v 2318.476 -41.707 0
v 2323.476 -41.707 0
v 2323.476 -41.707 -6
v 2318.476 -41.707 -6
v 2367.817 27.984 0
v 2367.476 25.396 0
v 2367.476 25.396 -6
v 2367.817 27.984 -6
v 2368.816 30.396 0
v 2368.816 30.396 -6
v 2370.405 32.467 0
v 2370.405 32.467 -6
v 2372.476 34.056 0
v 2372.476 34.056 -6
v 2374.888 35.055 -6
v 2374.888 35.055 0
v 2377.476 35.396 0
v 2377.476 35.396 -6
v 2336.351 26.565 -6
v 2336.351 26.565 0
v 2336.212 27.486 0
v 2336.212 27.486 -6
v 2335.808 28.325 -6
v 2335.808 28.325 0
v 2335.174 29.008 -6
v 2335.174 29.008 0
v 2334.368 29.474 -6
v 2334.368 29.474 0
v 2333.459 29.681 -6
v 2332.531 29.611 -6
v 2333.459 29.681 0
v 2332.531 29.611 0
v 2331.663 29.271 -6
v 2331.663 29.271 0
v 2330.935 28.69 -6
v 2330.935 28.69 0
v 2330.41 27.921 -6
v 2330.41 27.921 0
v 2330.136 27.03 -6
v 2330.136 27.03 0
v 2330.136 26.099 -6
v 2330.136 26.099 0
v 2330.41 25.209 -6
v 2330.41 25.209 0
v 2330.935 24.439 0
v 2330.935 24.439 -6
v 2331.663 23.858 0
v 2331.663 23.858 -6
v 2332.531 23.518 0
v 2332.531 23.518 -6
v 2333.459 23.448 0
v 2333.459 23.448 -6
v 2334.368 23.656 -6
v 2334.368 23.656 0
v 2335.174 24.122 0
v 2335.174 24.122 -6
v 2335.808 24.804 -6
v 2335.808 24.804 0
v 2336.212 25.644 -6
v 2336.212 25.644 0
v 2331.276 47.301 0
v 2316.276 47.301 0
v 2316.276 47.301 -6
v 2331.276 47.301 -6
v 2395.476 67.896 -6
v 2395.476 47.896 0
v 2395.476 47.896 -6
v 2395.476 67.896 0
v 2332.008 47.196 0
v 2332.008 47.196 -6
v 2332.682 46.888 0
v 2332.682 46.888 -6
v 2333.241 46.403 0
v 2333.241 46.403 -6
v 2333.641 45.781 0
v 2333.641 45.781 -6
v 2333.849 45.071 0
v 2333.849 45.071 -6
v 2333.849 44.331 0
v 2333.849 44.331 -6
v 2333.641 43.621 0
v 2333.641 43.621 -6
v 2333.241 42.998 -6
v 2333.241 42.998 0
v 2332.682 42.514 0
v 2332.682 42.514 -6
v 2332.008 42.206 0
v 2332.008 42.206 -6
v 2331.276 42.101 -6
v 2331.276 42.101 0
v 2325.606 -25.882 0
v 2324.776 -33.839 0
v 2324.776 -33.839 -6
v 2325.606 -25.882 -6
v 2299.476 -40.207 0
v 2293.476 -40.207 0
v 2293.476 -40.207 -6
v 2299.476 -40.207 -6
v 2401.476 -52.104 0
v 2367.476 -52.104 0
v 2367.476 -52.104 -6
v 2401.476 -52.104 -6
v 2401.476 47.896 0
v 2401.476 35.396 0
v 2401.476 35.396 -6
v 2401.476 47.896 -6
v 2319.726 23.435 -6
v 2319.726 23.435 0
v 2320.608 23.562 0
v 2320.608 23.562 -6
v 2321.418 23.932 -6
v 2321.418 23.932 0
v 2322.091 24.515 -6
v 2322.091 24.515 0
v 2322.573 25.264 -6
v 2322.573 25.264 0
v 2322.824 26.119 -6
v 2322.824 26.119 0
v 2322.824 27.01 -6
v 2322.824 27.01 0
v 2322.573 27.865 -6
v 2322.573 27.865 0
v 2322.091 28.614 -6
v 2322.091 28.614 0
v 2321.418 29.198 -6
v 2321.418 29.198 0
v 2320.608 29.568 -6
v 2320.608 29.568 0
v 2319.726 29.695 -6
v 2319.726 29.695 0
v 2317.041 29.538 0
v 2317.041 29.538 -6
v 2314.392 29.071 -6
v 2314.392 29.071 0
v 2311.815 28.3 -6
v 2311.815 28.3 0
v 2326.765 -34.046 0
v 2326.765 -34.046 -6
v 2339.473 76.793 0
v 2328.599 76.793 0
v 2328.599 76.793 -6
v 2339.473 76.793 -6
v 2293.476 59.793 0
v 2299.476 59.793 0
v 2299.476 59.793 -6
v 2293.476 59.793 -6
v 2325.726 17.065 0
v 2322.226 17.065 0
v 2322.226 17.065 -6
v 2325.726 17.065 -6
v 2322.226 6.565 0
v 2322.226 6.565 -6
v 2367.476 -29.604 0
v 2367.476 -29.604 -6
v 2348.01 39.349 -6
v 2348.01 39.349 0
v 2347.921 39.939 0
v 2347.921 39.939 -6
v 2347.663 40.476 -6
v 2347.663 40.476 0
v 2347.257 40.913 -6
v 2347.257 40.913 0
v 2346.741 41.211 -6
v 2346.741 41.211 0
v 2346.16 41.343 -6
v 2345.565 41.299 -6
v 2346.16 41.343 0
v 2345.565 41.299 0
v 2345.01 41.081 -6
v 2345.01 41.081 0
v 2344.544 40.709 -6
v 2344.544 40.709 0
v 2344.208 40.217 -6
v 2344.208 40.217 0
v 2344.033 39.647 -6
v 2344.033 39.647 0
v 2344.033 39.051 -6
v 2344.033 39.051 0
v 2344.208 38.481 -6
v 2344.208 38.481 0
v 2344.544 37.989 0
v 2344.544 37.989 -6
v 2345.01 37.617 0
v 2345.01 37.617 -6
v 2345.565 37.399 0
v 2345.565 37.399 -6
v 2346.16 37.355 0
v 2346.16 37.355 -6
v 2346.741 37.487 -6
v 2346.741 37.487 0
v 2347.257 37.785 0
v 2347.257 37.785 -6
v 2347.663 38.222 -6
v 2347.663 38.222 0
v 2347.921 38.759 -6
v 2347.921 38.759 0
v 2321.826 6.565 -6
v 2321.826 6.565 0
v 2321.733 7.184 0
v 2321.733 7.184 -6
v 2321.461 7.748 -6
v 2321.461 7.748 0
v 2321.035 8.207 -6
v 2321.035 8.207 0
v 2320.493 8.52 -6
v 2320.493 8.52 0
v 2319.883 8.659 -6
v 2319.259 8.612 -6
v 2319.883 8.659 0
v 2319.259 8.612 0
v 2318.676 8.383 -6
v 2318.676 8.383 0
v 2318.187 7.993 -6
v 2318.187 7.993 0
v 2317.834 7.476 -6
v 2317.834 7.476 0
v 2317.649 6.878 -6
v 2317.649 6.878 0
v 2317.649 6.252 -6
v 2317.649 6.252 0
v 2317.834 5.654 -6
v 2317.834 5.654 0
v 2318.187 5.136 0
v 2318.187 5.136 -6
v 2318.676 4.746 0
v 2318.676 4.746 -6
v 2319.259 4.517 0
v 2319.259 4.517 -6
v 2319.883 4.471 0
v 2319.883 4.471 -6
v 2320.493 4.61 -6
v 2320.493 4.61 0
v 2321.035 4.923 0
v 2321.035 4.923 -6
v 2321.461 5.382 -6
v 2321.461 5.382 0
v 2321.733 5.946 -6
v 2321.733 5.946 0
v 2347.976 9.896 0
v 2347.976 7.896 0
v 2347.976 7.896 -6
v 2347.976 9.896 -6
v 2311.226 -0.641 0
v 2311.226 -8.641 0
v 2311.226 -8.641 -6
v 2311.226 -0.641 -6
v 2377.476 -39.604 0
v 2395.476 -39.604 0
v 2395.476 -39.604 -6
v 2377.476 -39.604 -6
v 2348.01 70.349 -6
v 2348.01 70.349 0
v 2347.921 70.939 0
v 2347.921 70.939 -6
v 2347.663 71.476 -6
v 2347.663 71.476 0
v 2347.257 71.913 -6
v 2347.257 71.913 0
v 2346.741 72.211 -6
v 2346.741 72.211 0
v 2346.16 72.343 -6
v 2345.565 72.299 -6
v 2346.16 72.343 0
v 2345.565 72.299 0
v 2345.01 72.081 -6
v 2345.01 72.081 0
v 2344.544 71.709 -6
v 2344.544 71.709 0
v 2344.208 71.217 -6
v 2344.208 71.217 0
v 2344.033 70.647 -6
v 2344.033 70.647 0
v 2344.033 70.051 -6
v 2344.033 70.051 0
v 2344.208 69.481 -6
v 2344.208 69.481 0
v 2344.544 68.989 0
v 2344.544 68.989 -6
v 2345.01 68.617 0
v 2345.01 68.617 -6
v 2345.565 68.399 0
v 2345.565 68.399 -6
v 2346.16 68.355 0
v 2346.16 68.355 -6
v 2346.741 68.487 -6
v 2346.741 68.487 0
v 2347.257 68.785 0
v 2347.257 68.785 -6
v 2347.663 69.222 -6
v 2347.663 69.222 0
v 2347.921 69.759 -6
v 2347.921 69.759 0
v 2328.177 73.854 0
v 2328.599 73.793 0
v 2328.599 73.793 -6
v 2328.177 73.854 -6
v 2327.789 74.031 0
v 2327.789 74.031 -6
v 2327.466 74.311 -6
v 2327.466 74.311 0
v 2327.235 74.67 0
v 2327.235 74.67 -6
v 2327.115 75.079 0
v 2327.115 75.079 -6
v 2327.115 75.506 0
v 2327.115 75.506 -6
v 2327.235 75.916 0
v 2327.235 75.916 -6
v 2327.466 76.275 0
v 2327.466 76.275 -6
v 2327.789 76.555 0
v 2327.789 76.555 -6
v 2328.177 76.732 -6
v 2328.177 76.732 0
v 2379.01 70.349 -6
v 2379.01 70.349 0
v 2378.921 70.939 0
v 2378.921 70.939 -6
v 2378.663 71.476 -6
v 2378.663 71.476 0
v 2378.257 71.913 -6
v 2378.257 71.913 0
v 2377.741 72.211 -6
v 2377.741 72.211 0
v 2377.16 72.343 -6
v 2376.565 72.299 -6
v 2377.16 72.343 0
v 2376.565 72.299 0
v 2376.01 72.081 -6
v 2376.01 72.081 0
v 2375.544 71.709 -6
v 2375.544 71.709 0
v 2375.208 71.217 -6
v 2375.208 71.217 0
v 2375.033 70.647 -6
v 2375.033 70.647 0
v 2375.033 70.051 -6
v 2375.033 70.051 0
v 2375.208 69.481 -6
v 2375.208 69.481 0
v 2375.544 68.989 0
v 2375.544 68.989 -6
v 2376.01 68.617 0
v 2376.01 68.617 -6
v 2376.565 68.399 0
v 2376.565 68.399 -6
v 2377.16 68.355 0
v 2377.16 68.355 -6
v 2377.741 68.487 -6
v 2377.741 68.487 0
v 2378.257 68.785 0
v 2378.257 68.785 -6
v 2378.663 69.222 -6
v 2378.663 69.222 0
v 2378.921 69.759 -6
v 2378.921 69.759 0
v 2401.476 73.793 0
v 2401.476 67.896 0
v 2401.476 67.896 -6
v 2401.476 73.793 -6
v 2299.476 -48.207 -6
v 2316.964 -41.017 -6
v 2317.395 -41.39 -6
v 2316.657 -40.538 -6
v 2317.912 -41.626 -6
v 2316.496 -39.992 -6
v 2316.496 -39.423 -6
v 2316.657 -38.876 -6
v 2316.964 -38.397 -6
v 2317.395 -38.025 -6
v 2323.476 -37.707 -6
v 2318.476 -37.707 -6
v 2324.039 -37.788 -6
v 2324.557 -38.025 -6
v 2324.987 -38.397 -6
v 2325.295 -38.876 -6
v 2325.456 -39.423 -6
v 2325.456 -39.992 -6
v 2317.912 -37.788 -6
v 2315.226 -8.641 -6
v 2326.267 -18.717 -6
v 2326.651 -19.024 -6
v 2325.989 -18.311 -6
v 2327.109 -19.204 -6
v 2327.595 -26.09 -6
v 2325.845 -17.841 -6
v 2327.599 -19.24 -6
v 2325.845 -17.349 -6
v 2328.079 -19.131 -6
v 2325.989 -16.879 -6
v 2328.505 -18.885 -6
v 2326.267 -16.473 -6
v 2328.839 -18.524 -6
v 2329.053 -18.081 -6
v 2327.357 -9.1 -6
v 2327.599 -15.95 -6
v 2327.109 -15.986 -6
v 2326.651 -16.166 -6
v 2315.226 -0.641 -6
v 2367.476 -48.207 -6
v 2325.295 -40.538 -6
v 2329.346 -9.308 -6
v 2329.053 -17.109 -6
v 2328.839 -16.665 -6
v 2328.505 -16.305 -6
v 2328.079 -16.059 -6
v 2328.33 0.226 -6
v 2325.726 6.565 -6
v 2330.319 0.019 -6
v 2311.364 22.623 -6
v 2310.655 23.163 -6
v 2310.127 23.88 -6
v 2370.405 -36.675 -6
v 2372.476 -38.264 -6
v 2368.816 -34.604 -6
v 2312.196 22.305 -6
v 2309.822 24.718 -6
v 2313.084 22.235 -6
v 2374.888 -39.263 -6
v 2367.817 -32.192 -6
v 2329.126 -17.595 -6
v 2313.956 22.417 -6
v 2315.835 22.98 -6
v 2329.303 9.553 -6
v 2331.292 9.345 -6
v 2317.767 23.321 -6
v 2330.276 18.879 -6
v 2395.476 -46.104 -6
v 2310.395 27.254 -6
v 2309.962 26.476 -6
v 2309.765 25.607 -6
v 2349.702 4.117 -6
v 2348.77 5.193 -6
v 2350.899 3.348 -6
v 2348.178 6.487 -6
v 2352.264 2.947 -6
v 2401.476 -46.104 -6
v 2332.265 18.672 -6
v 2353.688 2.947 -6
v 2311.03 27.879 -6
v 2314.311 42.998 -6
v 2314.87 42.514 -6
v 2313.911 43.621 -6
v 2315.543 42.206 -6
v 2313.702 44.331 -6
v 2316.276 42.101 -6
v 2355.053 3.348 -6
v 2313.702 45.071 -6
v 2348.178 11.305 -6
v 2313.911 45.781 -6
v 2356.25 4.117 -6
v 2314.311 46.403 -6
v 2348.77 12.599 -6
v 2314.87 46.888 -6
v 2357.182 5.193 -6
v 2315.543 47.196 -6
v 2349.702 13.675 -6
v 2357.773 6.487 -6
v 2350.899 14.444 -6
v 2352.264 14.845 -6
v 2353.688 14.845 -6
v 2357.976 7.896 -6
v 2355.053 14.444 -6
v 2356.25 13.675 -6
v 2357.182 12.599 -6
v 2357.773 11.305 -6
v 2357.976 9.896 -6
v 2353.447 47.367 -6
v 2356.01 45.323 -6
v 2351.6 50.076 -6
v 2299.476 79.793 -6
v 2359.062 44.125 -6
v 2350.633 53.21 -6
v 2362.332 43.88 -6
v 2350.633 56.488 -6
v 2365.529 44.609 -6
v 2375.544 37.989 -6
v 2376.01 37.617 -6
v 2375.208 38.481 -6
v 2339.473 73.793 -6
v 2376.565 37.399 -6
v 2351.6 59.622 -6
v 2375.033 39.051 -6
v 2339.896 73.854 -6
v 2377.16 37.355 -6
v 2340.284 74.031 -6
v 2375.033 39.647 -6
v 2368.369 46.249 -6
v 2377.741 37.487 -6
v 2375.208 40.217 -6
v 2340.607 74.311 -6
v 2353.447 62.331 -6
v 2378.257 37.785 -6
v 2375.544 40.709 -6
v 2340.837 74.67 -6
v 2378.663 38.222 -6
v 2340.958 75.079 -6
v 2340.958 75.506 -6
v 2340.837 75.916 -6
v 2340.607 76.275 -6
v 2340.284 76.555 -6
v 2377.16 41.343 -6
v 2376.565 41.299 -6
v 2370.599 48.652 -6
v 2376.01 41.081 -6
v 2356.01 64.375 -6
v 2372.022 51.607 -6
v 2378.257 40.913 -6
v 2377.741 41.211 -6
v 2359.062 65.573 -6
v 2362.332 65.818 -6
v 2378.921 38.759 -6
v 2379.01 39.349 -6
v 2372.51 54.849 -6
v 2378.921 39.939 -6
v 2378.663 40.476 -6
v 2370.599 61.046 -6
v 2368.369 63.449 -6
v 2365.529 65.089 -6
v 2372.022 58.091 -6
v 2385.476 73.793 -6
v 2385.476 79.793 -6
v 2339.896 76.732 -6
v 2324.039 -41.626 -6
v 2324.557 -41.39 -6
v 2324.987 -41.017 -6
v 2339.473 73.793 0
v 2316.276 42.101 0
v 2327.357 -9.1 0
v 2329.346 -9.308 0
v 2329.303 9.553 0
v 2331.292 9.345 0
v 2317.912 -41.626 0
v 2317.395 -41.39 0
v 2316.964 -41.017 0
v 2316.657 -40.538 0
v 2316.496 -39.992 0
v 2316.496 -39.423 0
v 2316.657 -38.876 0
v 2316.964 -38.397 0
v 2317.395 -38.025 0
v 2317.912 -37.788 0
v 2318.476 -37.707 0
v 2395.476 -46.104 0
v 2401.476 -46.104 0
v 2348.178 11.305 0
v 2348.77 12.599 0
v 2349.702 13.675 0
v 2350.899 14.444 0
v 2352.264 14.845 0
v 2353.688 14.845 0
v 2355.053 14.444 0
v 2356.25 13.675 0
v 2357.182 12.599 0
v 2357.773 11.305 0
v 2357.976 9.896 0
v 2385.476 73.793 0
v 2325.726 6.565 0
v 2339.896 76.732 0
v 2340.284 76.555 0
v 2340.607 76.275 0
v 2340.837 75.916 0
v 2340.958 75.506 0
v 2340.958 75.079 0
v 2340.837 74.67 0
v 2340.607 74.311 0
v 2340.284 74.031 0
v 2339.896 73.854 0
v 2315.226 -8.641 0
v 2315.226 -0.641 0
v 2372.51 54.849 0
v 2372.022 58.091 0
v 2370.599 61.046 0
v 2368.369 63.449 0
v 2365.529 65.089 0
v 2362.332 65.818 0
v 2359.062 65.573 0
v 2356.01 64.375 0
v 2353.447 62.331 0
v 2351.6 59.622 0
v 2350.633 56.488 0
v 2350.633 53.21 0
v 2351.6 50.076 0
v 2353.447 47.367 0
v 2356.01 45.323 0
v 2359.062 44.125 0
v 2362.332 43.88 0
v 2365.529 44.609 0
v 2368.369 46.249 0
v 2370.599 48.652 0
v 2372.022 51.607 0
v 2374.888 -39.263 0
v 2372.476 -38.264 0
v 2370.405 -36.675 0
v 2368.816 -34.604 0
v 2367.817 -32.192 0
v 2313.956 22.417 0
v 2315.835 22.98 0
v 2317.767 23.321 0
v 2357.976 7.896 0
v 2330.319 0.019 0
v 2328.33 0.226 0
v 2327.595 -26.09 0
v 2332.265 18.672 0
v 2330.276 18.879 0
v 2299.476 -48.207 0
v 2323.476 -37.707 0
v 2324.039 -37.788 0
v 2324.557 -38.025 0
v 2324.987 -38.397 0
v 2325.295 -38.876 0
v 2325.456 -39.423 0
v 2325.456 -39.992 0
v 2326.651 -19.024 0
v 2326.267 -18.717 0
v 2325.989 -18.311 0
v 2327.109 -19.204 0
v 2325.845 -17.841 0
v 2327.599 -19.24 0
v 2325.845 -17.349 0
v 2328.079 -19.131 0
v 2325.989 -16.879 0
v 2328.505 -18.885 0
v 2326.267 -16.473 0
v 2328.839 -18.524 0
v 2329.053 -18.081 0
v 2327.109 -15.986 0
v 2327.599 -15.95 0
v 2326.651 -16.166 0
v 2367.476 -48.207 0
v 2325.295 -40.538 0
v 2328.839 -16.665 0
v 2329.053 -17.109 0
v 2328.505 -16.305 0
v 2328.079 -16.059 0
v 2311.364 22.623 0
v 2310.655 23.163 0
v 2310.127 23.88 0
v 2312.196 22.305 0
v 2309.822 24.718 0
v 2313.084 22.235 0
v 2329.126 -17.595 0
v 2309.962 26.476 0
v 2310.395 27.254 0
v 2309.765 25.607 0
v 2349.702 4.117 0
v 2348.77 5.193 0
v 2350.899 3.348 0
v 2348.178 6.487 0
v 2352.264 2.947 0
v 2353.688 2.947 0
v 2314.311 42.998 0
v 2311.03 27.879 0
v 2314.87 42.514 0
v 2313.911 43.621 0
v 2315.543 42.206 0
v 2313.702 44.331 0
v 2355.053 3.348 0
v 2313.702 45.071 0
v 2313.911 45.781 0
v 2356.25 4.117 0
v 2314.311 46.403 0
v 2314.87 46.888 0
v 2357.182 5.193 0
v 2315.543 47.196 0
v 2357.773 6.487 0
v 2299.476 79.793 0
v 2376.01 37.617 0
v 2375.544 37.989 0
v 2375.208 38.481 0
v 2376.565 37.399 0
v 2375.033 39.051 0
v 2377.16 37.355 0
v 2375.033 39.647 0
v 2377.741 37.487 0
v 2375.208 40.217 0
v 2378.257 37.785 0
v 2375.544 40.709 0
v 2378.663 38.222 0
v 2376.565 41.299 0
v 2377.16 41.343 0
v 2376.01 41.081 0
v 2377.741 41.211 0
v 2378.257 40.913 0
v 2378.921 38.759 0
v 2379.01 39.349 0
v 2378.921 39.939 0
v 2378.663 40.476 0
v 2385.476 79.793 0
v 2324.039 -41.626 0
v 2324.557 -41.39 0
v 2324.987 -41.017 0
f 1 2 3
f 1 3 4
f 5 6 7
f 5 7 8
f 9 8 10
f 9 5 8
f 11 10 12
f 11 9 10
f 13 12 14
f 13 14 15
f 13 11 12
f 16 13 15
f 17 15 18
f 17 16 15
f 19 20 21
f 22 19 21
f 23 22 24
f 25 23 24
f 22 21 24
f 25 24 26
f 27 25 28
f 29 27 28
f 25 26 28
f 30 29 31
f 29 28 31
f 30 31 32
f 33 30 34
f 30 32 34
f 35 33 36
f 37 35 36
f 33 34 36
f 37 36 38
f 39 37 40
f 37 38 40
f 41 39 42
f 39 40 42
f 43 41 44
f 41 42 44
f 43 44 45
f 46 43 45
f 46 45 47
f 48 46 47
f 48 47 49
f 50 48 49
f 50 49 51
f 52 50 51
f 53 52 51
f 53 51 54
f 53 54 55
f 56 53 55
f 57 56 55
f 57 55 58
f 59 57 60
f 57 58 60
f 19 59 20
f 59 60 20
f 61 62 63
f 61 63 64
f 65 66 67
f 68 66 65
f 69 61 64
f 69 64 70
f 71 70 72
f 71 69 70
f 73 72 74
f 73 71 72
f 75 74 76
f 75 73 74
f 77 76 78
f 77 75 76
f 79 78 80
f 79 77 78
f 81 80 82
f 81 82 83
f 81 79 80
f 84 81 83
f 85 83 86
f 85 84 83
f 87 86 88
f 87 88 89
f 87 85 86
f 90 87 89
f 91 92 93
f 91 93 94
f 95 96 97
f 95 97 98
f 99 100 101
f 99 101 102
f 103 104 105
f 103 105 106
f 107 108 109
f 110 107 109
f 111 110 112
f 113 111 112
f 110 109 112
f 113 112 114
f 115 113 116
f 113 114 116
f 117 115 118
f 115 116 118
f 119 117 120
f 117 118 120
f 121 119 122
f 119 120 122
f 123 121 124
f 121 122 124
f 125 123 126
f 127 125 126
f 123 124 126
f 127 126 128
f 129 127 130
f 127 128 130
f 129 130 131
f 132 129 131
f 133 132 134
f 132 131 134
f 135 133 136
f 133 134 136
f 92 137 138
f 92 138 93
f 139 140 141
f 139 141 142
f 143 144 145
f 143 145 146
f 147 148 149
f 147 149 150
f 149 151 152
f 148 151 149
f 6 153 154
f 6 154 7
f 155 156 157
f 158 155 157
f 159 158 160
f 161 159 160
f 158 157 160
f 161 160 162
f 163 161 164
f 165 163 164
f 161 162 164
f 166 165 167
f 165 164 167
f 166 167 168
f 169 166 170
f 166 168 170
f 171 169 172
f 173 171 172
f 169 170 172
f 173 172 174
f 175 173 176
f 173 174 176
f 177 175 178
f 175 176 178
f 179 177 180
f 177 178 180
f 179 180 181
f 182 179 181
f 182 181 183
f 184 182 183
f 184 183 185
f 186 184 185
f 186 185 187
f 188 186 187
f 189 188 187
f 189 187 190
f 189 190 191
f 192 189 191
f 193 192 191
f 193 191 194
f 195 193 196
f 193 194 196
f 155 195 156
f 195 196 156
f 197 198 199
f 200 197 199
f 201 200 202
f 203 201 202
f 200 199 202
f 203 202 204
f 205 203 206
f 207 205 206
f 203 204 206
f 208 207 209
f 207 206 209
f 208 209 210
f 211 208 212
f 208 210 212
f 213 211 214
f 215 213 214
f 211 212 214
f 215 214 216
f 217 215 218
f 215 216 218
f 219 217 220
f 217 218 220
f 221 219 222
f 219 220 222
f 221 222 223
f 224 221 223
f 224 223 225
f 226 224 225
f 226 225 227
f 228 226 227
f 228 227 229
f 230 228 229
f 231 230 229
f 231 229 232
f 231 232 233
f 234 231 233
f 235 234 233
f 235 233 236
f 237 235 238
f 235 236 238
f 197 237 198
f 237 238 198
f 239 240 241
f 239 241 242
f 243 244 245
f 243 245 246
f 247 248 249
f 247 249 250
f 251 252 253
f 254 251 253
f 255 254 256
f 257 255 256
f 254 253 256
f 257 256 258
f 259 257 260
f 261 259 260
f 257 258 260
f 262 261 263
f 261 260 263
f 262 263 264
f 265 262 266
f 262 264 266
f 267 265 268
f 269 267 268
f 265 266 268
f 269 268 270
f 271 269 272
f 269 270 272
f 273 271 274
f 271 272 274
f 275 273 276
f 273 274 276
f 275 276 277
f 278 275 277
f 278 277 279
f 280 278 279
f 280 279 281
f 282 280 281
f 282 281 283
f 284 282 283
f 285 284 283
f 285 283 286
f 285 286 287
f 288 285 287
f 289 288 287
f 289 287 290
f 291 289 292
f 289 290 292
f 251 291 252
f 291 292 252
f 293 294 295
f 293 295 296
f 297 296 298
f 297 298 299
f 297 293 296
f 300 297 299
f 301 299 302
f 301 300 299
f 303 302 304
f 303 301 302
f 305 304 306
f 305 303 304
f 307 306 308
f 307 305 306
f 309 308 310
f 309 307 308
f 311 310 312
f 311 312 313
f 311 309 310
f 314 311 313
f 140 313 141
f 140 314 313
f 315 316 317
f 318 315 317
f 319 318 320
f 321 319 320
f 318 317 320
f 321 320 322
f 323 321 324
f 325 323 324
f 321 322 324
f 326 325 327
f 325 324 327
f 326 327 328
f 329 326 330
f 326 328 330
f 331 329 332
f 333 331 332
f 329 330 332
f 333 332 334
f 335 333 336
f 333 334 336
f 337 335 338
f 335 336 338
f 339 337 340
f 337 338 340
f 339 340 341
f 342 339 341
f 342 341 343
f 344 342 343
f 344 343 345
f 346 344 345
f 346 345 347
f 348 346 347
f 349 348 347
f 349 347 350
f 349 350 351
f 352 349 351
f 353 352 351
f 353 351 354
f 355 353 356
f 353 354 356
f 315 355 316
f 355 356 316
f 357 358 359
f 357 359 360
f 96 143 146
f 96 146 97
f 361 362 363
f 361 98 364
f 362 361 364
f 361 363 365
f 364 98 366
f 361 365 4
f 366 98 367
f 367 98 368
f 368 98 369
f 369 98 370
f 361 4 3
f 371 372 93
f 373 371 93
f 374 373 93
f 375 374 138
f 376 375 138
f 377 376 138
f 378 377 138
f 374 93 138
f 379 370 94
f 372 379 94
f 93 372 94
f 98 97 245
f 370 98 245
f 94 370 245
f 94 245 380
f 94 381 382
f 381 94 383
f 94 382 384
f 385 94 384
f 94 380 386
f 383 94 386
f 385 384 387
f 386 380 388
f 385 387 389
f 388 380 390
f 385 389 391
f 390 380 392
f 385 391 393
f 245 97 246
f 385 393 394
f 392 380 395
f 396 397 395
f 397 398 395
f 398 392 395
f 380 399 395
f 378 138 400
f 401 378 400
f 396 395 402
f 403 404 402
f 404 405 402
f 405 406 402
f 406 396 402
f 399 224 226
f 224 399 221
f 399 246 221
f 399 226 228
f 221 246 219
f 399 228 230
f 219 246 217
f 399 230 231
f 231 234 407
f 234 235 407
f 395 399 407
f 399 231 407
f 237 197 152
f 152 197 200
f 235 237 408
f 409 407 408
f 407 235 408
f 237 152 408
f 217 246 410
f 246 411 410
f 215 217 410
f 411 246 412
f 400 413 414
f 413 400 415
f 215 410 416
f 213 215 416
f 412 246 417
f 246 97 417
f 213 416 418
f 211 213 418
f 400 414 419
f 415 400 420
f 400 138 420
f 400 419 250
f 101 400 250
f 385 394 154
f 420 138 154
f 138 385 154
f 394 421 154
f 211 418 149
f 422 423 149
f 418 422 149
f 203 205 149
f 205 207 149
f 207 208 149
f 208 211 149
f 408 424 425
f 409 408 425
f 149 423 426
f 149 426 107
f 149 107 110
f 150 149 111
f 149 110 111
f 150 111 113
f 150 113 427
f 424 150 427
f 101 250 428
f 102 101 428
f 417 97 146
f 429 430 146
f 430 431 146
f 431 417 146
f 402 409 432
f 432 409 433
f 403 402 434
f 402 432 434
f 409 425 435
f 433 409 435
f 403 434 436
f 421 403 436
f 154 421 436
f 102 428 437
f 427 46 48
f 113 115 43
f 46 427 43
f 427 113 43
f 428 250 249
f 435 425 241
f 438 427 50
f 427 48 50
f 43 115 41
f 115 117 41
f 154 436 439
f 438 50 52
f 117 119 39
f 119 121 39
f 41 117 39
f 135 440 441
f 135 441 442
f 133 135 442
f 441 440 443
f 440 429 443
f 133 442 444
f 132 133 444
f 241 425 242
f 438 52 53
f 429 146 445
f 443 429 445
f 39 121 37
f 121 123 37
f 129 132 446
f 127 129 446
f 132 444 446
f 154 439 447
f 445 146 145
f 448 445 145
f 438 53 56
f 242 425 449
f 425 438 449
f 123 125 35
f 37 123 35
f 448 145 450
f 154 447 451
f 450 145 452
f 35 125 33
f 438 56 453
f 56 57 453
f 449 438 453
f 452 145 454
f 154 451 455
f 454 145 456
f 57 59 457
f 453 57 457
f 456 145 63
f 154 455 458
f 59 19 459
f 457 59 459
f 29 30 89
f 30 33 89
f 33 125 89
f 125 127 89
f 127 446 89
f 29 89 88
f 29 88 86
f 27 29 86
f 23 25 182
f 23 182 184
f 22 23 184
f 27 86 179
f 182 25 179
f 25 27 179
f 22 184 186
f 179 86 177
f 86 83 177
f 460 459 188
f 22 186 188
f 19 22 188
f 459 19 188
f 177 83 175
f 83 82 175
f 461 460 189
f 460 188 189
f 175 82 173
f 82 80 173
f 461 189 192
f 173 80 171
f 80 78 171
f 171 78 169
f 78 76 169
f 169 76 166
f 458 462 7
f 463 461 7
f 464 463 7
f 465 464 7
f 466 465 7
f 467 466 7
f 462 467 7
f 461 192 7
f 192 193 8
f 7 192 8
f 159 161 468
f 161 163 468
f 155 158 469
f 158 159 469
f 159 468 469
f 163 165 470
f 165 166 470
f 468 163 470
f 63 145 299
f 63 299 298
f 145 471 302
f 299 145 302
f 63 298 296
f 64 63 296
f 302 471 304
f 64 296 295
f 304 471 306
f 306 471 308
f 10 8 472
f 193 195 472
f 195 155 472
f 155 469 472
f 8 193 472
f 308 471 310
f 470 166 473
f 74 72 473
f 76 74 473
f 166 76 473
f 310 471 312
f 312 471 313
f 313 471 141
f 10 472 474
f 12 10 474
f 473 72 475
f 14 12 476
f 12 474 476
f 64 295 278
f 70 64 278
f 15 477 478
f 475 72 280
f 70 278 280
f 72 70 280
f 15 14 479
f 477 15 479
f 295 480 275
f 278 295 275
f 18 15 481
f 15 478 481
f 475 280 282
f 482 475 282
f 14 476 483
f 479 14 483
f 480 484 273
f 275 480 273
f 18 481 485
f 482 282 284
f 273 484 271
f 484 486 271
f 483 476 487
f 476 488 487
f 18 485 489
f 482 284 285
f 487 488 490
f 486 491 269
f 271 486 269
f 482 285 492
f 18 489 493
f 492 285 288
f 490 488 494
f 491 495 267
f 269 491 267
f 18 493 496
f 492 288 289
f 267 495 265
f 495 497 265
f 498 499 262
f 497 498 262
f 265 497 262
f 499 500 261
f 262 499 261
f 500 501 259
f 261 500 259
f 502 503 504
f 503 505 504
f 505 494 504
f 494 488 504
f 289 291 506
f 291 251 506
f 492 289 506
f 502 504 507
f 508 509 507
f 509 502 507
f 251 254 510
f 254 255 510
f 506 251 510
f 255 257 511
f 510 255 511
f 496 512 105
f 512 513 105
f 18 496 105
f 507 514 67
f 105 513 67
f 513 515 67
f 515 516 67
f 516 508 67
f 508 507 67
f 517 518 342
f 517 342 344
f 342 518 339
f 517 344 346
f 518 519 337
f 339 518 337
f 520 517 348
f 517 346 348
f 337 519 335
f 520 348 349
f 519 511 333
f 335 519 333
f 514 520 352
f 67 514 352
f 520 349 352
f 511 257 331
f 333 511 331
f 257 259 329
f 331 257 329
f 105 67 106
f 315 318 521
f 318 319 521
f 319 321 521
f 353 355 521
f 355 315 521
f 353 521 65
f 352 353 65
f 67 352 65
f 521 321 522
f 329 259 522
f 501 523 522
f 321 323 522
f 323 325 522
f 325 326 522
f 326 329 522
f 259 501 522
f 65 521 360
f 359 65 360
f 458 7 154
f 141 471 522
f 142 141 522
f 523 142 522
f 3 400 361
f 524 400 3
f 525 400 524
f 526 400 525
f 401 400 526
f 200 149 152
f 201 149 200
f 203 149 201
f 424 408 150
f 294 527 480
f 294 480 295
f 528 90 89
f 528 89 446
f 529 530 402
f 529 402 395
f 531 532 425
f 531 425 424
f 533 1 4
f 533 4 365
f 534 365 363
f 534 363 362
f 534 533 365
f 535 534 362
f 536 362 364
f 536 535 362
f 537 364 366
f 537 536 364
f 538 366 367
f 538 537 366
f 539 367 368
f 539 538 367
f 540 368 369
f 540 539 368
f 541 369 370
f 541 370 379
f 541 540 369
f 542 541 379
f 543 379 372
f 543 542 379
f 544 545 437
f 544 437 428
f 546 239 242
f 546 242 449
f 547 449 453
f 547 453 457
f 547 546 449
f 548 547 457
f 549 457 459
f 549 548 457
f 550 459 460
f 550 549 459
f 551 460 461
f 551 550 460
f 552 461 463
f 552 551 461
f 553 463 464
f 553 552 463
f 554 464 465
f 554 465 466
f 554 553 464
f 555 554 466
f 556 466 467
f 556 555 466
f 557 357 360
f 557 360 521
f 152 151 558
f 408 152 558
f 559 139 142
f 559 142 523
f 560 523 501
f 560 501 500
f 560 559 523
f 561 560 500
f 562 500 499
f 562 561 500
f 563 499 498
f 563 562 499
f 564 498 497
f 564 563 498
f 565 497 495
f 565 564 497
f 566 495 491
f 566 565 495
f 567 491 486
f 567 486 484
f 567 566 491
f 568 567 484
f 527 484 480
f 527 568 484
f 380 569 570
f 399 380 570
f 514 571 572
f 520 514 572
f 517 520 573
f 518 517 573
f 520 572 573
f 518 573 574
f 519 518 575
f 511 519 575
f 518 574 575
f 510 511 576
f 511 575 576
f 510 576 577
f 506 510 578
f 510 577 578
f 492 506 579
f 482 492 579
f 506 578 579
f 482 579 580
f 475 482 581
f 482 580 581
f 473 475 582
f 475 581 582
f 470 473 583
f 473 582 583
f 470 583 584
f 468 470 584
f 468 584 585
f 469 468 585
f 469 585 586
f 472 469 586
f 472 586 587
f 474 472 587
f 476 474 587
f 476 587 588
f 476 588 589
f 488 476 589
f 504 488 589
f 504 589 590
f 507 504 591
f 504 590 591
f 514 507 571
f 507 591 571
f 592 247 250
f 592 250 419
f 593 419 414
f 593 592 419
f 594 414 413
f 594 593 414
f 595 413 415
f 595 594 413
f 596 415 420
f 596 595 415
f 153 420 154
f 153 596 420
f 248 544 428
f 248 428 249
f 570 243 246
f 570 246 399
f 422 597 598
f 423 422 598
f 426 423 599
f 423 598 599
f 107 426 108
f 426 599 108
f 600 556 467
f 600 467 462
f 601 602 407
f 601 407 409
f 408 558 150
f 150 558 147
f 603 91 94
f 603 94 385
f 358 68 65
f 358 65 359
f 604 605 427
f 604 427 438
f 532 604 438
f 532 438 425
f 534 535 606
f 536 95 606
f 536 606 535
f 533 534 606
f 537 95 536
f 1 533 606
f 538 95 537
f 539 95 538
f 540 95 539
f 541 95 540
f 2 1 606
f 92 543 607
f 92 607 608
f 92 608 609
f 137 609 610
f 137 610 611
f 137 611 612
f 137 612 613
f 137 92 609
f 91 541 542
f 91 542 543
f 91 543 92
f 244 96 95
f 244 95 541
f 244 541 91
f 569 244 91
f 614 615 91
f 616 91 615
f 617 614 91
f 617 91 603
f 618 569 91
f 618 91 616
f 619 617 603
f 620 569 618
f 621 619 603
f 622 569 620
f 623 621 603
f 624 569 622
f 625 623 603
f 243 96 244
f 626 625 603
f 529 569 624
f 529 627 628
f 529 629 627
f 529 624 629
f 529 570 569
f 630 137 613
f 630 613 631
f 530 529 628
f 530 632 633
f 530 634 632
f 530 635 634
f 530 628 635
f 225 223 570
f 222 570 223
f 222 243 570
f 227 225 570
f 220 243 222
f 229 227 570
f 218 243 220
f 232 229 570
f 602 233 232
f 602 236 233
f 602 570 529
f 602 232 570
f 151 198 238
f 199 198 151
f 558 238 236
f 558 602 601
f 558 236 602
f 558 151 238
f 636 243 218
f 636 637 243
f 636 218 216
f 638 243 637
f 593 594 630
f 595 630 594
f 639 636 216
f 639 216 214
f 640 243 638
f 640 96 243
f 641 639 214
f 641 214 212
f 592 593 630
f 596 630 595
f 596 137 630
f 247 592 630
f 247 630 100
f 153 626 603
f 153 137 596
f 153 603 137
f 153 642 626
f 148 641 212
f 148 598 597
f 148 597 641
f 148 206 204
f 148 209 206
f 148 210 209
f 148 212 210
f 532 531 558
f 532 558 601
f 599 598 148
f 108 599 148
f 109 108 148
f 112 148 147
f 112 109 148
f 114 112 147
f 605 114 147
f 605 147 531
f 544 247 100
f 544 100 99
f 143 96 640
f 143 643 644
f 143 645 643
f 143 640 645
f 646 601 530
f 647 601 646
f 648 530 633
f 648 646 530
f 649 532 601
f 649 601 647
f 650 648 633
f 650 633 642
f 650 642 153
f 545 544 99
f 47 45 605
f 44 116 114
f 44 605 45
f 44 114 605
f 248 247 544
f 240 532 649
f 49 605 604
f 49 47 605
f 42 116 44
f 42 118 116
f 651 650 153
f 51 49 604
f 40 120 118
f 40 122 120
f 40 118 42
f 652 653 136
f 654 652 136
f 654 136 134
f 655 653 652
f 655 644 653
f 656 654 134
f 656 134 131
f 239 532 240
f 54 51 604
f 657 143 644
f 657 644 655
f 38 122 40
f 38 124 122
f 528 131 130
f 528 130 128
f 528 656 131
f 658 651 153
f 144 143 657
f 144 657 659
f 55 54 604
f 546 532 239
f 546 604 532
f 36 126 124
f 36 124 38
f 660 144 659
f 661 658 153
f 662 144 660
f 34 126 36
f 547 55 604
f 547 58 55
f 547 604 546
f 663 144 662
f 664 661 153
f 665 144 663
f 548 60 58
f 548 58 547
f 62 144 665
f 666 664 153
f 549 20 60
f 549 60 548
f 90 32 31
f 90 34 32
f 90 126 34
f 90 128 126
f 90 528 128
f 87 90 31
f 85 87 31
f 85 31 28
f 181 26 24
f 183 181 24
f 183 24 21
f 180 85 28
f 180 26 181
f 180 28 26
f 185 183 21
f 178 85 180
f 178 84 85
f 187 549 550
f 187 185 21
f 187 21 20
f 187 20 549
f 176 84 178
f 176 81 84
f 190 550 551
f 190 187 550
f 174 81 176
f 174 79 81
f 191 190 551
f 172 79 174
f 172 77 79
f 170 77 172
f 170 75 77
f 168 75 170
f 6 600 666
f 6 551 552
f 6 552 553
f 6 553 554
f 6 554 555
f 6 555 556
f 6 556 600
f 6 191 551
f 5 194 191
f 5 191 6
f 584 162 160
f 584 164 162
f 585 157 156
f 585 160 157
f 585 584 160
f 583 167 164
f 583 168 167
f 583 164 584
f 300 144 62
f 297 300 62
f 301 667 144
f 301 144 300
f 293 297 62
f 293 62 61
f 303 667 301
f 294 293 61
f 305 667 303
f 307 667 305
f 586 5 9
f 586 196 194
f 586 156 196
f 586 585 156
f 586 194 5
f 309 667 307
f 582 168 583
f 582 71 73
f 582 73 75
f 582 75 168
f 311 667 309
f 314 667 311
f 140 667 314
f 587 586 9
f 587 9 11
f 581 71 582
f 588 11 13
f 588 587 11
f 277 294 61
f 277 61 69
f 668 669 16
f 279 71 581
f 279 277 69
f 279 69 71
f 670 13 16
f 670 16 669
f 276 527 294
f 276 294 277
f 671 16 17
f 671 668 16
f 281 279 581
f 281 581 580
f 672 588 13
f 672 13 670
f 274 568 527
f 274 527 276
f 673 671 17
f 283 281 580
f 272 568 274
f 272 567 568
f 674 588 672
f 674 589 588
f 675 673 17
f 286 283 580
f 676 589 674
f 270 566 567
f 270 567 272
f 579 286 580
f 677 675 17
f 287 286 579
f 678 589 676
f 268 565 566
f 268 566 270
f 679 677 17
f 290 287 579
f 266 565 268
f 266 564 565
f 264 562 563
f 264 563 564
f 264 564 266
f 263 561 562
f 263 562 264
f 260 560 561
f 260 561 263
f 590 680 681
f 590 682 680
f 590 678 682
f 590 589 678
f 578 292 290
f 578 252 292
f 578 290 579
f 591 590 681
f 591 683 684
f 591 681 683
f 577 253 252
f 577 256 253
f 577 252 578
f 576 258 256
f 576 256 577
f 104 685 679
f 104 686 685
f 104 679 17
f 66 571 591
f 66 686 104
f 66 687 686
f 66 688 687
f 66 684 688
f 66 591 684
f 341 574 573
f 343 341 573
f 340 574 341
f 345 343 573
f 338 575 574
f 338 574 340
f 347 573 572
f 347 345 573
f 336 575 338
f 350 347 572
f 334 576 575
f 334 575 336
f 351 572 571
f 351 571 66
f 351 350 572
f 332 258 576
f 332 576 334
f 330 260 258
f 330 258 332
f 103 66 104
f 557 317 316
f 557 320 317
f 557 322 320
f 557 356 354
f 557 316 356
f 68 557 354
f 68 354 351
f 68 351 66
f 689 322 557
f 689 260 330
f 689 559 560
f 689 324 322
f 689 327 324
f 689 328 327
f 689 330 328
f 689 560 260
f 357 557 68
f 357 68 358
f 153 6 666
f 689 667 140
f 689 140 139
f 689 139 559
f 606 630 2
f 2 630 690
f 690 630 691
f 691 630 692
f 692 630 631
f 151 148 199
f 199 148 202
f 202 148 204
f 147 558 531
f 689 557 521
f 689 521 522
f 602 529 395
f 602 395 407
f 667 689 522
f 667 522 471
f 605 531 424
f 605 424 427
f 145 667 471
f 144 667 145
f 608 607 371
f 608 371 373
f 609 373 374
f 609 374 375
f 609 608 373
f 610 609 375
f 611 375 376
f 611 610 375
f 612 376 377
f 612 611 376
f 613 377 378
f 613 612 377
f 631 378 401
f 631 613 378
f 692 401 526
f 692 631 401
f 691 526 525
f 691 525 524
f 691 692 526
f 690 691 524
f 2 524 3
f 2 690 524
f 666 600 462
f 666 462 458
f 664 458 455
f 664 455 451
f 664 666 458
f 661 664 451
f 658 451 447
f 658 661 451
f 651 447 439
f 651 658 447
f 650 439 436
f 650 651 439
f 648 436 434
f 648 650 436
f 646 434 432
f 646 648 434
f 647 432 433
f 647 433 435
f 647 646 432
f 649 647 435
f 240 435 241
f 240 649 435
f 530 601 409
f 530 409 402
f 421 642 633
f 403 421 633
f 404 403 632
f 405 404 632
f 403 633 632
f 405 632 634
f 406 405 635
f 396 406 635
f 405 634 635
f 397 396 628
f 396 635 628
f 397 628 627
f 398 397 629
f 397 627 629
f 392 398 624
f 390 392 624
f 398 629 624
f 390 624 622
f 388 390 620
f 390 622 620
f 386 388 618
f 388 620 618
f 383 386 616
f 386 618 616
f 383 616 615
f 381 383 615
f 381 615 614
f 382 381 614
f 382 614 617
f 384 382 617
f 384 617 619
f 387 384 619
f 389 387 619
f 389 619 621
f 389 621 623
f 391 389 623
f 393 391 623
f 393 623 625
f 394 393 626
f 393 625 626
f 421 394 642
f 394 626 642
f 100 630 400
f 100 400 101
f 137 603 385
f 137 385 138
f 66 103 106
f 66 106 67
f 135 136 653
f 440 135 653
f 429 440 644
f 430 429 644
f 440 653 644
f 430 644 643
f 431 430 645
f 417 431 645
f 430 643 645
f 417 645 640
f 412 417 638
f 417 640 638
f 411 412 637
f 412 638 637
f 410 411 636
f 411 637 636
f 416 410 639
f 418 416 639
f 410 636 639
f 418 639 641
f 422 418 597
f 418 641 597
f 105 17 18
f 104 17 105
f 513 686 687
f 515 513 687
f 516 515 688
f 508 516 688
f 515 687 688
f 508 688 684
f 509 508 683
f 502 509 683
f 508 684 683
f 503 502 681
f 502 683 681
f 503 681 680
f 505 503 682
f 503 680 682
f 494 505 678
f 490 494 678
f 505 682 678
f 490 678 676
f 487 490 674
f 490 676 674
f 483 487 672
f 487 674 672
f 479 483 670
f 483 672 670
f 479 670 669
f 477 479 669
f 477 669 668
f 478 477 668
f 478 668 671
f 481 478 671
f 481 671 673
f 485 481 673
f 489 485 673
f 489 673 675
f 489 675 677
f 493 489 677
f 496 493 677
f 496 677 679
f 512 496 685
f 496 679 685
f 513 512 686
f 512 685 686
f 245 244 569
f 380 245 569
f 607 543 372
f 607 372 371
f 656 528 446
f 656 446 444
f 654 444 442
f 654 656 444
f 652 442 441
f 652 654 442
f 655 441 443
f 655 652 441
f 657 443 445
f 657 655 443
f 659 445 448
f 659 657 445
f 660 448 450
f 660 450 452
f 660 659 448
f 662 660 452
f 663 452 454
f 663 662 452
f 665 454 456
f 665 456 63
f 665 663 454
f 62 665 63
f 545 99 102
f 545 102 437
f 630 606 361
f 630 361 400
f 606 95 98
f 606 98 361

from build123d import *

# Parameters (mm, degrees)
ESQUISSE1_R        = 2
ESQUISSE1_R_2      = 11
ESQUISSE1_R_3      = 3.125
ESQUISSE1_R_4      = 2.1
ESQUISSE1_R_5      = 1.65
ESQUISSE1_W        = 4
ESQUISSE1_H        = 8
ESQUISSE1_W_2      = 3.5
ESQUISSE1_H_2      = 10.5
BOSS_EXTRU_1_DEPTH = 6


with BuildPart() as part:
    # Esquisse1 → Boss.-Extru.1 (new body)
    with BuildSketch(Plane.XY):
        with BuildLine():
            Line((2401.475943532, -52.104091931), (2401.475943532, -46.104091931))
            Line((2401.475943532, -46.104091931), (2395.475943532, -46.104091931))
            Line((2395.475943532, -46.104091931), (2395.475943532, -39.604091931))
            Line((2395.475943532, -39.604091931), (2377.475943532, -39.604091931))
            ThreePointArc((2377.475943532, -39.604091931), (2370.40487572, -36.675159743), (2367.475943532, -29.604091931))
            Line((2367.475943532, -29.604091931), (2367.475943532, 25.395908069))
            ThreePointArc((2367.475943532, 25.395908069), (2370.40487572, 32.466975881), (2377.475943532, 35.395908069))
            Line((2377.475943532, 35.395908069), (2397.475943532, 35.395908069))
            Line((2397.475943532, 35.395908069), (2401.475943532, 35.395908069))
            Line((2401.475943532, 35.395908069), (2401.475943532, 47.895908069))
            Line((2401.475943532, 47.895908069), (2395.475943532, 47.895908069))
            Line((2395.475943532, 47.895908069), (2395.475943532, 67.895908069))
            Line((2395.475943532, 67.895908069), (2401.475943532, 67.895908069))
            Line((2401.475943532, 67.895908069), (2401.475943532, 73.792808343))
            Line((2401.475943532, 73.792808343), (2395.475943532, 73.792808343))
            Line((2395.475943532, 73.792808343), (2385.475943532, 73.792808343))
            Line((2385.475943532, 73.792808343), (2385.475943532, 79.792808343))
            Line((2385.475943532, 79.792808343), (2299.475943532, 79.792808343))
            Line((2299.475943532, 79.792808343), (2299.475943532, 59.792808343))
            Line((2299.475943532, 59.792808343), (2293.475943532, 59.792808343))
            Line((2293.475943532, 59.792808343), (2293.475943532, -40.20719166))
            Line((2293.475943532, -40.20719166), (2299.475943532, -40.20719166))
            Line((2299.475943532, -40.20719166), (2299.475943532, -48.20719166))
            Line((2299.475943532, -48.20719166), (2367.475943532, -48.20719166))
            Line((2367.475943532, -48.20719166), (2367.475943532, -52.104091931))
            Line((2367.475943532, -52.104091931), (2401.475943532, -52.104091931))
        make_face()
        with Locations((2346.01021478, 70.349007801)):
            Circle(ESQUISSE1_R, mode=Mode.SUBTRACT)
        with Locations((2377.01021478, 70.349007801)):
            Circle(ESQUISSE1_R, mode=Mode.SUBTRACT)
        with Locations((2377.01021478, 39.349007801)):
            Circle(ESQUISSE1_R, mode=Mode.SUBTRACT)
        with Locations((2361.51021478, 54.849007801)):
            Circle(ESQUISSE1_R_2, mode=Mode.SUBTRACT)
        with Locations((2346.01021478, 39.349007801)):
            Circle(ESQUISSE1_R, mode=Mode.SUBTRACT)
        with Locations((2333.225943532, 26.564736553)):
            Circle(ESQUISSE1_R_3, mode=Mode.SUBTRACT)
        with Locations((2319.725943533, 6.564736553)):
            Circle(ESQUISSE1_R_4, mode=Mode.SUBTRACT)
        with Locations((2327.476078896, -17.594891177)):
            Circle(ESQUISSE1_R_5, mode=Mode.SUBTRACT)
        with BuildLine():
            Line((2331.275943532, 42.100855433), (2316.275943532, 42.100855433))
            ThreePointArc((2316.275943532, 42.100855433), (2313.675943532, 44.700855433), (2316.275943532, 47.300855433))
            Line((2316.275943532, 47.300855433), (2331.275943532, 47.300855433))
            ThreePointArc((2331.275943532, 47.300855433), (2333.875943532, 44.700855433), (2331.275943532, 42.100855433))
        make_face(mode=Mode.SUBTRACT)
        with BuildLine():
            Line((2347.975943532, 7.895908069), (2347.975943532, 9.895908069))
            ThreePointArc((2347.975943532, 9.895908069), (2352.975943532, 14.895908069), (2357.975943532, 9.895908069))
            Line((2357.975943532, 9.895908069), (2357.975943532, 7.895908069))
            ThreePointArc((2357.975943532, 7.895908069), (2352.975943532, 2.895908069), (2347.975943532, 7.895908069))
        make_face(mode=Mode.SUBTRACT)
        with BuildLine():
            Line((2339.47303261, 73.792808343), (2328.599494457, 73.792808343))
            ThreePointArc((2328.599494457, 73.792808343), (2327.099494457, 75.292808343), (2328.599494457, 76.792808343))
            Line((2328.599494457, 76.792808343), (2339.47303261, 76.792808343))
            ThreePointArc((2339.47303261, 76.792808343), (2340.97303261, 75.292808343), (2339.47303261, 73.792808343))
        make_face(mode=Mode.SUBTRACT)
        with Locations((2313.225943533, -4.641462904)):
            Rectangle(ESQUISSE1_W, ESQUISSE1_H, mode=Mode.SUBTRACT)
        Polygon((2329.302925864, 9.55284837), (2330.275943532, 18.879356423), (2332.265147216, 18.67182641), (2331.292129548, 9.345318358), align=None, mode=Mode.SUBTRACT)
        Polygon((2327.356890528, -9.100167734), (2328.329908196, 0.226340318), (2330.31911188, 0.018810306), (2329.346094212, -9.307697746), align=None, mode=Mode.SUBTRACT)
        Polygon((2324.775943532, -33.838899342), (2325.606063581, -25.882084609), (2327.595267264, -26.089614621), (2326.765147216, -34.046429354), align=None, mode=Mode.SUBTRACT)
        with Locations((2323.975943533, 11.814736553)):
            Rectangle(ESQUISSE1_W_2, ESQUISSE1_H_2, mode=Mode.SUBTRACT)
        with BuildLine():
            Line((2318.475943532, -37.70719166), (2323.475943532, -37.70719166))
            ThreePointArc((2323.475943532, -37.70719166), (2325.475943532, -39.70719166), (2323.475943532, -41.70719166))
            Line((2323.475943532, -41.70719166), (2318.475943532, -41.70719166))
            ThreePointArc((2318.475943532, -41.70719166), (2316.475943532, -39.70719166), (2318.475943532, -37.70719166))
        make_face(mode=Mode.SUBTRACT)
        with BuildLine():
            ThreePointArc((2319.725943533, 29.694736553), (2315.709461183, 29.34333988), (2311.815017618, 28.299826872))
            ThreePointArc((2311.815017618, 28.299826872), (2309.944302763, 24.28806592), (2313.956063715, 22.417351066))
            ThreePointArc((2313.956063715, 22.417351066), (2316.796498776, 23.178443347), (2319.725943533, 23.434736553))
            ThreePointArc((2319.725943533, 23.434736553), (2322.855943533, 26.564736553), (2319.725943533, 29.694736553))
        make_face(mode=Mode.SUBTRACT)
    extrude(amount=-BOSS_EXTRU_1_DEPTH)


solid = part.part
